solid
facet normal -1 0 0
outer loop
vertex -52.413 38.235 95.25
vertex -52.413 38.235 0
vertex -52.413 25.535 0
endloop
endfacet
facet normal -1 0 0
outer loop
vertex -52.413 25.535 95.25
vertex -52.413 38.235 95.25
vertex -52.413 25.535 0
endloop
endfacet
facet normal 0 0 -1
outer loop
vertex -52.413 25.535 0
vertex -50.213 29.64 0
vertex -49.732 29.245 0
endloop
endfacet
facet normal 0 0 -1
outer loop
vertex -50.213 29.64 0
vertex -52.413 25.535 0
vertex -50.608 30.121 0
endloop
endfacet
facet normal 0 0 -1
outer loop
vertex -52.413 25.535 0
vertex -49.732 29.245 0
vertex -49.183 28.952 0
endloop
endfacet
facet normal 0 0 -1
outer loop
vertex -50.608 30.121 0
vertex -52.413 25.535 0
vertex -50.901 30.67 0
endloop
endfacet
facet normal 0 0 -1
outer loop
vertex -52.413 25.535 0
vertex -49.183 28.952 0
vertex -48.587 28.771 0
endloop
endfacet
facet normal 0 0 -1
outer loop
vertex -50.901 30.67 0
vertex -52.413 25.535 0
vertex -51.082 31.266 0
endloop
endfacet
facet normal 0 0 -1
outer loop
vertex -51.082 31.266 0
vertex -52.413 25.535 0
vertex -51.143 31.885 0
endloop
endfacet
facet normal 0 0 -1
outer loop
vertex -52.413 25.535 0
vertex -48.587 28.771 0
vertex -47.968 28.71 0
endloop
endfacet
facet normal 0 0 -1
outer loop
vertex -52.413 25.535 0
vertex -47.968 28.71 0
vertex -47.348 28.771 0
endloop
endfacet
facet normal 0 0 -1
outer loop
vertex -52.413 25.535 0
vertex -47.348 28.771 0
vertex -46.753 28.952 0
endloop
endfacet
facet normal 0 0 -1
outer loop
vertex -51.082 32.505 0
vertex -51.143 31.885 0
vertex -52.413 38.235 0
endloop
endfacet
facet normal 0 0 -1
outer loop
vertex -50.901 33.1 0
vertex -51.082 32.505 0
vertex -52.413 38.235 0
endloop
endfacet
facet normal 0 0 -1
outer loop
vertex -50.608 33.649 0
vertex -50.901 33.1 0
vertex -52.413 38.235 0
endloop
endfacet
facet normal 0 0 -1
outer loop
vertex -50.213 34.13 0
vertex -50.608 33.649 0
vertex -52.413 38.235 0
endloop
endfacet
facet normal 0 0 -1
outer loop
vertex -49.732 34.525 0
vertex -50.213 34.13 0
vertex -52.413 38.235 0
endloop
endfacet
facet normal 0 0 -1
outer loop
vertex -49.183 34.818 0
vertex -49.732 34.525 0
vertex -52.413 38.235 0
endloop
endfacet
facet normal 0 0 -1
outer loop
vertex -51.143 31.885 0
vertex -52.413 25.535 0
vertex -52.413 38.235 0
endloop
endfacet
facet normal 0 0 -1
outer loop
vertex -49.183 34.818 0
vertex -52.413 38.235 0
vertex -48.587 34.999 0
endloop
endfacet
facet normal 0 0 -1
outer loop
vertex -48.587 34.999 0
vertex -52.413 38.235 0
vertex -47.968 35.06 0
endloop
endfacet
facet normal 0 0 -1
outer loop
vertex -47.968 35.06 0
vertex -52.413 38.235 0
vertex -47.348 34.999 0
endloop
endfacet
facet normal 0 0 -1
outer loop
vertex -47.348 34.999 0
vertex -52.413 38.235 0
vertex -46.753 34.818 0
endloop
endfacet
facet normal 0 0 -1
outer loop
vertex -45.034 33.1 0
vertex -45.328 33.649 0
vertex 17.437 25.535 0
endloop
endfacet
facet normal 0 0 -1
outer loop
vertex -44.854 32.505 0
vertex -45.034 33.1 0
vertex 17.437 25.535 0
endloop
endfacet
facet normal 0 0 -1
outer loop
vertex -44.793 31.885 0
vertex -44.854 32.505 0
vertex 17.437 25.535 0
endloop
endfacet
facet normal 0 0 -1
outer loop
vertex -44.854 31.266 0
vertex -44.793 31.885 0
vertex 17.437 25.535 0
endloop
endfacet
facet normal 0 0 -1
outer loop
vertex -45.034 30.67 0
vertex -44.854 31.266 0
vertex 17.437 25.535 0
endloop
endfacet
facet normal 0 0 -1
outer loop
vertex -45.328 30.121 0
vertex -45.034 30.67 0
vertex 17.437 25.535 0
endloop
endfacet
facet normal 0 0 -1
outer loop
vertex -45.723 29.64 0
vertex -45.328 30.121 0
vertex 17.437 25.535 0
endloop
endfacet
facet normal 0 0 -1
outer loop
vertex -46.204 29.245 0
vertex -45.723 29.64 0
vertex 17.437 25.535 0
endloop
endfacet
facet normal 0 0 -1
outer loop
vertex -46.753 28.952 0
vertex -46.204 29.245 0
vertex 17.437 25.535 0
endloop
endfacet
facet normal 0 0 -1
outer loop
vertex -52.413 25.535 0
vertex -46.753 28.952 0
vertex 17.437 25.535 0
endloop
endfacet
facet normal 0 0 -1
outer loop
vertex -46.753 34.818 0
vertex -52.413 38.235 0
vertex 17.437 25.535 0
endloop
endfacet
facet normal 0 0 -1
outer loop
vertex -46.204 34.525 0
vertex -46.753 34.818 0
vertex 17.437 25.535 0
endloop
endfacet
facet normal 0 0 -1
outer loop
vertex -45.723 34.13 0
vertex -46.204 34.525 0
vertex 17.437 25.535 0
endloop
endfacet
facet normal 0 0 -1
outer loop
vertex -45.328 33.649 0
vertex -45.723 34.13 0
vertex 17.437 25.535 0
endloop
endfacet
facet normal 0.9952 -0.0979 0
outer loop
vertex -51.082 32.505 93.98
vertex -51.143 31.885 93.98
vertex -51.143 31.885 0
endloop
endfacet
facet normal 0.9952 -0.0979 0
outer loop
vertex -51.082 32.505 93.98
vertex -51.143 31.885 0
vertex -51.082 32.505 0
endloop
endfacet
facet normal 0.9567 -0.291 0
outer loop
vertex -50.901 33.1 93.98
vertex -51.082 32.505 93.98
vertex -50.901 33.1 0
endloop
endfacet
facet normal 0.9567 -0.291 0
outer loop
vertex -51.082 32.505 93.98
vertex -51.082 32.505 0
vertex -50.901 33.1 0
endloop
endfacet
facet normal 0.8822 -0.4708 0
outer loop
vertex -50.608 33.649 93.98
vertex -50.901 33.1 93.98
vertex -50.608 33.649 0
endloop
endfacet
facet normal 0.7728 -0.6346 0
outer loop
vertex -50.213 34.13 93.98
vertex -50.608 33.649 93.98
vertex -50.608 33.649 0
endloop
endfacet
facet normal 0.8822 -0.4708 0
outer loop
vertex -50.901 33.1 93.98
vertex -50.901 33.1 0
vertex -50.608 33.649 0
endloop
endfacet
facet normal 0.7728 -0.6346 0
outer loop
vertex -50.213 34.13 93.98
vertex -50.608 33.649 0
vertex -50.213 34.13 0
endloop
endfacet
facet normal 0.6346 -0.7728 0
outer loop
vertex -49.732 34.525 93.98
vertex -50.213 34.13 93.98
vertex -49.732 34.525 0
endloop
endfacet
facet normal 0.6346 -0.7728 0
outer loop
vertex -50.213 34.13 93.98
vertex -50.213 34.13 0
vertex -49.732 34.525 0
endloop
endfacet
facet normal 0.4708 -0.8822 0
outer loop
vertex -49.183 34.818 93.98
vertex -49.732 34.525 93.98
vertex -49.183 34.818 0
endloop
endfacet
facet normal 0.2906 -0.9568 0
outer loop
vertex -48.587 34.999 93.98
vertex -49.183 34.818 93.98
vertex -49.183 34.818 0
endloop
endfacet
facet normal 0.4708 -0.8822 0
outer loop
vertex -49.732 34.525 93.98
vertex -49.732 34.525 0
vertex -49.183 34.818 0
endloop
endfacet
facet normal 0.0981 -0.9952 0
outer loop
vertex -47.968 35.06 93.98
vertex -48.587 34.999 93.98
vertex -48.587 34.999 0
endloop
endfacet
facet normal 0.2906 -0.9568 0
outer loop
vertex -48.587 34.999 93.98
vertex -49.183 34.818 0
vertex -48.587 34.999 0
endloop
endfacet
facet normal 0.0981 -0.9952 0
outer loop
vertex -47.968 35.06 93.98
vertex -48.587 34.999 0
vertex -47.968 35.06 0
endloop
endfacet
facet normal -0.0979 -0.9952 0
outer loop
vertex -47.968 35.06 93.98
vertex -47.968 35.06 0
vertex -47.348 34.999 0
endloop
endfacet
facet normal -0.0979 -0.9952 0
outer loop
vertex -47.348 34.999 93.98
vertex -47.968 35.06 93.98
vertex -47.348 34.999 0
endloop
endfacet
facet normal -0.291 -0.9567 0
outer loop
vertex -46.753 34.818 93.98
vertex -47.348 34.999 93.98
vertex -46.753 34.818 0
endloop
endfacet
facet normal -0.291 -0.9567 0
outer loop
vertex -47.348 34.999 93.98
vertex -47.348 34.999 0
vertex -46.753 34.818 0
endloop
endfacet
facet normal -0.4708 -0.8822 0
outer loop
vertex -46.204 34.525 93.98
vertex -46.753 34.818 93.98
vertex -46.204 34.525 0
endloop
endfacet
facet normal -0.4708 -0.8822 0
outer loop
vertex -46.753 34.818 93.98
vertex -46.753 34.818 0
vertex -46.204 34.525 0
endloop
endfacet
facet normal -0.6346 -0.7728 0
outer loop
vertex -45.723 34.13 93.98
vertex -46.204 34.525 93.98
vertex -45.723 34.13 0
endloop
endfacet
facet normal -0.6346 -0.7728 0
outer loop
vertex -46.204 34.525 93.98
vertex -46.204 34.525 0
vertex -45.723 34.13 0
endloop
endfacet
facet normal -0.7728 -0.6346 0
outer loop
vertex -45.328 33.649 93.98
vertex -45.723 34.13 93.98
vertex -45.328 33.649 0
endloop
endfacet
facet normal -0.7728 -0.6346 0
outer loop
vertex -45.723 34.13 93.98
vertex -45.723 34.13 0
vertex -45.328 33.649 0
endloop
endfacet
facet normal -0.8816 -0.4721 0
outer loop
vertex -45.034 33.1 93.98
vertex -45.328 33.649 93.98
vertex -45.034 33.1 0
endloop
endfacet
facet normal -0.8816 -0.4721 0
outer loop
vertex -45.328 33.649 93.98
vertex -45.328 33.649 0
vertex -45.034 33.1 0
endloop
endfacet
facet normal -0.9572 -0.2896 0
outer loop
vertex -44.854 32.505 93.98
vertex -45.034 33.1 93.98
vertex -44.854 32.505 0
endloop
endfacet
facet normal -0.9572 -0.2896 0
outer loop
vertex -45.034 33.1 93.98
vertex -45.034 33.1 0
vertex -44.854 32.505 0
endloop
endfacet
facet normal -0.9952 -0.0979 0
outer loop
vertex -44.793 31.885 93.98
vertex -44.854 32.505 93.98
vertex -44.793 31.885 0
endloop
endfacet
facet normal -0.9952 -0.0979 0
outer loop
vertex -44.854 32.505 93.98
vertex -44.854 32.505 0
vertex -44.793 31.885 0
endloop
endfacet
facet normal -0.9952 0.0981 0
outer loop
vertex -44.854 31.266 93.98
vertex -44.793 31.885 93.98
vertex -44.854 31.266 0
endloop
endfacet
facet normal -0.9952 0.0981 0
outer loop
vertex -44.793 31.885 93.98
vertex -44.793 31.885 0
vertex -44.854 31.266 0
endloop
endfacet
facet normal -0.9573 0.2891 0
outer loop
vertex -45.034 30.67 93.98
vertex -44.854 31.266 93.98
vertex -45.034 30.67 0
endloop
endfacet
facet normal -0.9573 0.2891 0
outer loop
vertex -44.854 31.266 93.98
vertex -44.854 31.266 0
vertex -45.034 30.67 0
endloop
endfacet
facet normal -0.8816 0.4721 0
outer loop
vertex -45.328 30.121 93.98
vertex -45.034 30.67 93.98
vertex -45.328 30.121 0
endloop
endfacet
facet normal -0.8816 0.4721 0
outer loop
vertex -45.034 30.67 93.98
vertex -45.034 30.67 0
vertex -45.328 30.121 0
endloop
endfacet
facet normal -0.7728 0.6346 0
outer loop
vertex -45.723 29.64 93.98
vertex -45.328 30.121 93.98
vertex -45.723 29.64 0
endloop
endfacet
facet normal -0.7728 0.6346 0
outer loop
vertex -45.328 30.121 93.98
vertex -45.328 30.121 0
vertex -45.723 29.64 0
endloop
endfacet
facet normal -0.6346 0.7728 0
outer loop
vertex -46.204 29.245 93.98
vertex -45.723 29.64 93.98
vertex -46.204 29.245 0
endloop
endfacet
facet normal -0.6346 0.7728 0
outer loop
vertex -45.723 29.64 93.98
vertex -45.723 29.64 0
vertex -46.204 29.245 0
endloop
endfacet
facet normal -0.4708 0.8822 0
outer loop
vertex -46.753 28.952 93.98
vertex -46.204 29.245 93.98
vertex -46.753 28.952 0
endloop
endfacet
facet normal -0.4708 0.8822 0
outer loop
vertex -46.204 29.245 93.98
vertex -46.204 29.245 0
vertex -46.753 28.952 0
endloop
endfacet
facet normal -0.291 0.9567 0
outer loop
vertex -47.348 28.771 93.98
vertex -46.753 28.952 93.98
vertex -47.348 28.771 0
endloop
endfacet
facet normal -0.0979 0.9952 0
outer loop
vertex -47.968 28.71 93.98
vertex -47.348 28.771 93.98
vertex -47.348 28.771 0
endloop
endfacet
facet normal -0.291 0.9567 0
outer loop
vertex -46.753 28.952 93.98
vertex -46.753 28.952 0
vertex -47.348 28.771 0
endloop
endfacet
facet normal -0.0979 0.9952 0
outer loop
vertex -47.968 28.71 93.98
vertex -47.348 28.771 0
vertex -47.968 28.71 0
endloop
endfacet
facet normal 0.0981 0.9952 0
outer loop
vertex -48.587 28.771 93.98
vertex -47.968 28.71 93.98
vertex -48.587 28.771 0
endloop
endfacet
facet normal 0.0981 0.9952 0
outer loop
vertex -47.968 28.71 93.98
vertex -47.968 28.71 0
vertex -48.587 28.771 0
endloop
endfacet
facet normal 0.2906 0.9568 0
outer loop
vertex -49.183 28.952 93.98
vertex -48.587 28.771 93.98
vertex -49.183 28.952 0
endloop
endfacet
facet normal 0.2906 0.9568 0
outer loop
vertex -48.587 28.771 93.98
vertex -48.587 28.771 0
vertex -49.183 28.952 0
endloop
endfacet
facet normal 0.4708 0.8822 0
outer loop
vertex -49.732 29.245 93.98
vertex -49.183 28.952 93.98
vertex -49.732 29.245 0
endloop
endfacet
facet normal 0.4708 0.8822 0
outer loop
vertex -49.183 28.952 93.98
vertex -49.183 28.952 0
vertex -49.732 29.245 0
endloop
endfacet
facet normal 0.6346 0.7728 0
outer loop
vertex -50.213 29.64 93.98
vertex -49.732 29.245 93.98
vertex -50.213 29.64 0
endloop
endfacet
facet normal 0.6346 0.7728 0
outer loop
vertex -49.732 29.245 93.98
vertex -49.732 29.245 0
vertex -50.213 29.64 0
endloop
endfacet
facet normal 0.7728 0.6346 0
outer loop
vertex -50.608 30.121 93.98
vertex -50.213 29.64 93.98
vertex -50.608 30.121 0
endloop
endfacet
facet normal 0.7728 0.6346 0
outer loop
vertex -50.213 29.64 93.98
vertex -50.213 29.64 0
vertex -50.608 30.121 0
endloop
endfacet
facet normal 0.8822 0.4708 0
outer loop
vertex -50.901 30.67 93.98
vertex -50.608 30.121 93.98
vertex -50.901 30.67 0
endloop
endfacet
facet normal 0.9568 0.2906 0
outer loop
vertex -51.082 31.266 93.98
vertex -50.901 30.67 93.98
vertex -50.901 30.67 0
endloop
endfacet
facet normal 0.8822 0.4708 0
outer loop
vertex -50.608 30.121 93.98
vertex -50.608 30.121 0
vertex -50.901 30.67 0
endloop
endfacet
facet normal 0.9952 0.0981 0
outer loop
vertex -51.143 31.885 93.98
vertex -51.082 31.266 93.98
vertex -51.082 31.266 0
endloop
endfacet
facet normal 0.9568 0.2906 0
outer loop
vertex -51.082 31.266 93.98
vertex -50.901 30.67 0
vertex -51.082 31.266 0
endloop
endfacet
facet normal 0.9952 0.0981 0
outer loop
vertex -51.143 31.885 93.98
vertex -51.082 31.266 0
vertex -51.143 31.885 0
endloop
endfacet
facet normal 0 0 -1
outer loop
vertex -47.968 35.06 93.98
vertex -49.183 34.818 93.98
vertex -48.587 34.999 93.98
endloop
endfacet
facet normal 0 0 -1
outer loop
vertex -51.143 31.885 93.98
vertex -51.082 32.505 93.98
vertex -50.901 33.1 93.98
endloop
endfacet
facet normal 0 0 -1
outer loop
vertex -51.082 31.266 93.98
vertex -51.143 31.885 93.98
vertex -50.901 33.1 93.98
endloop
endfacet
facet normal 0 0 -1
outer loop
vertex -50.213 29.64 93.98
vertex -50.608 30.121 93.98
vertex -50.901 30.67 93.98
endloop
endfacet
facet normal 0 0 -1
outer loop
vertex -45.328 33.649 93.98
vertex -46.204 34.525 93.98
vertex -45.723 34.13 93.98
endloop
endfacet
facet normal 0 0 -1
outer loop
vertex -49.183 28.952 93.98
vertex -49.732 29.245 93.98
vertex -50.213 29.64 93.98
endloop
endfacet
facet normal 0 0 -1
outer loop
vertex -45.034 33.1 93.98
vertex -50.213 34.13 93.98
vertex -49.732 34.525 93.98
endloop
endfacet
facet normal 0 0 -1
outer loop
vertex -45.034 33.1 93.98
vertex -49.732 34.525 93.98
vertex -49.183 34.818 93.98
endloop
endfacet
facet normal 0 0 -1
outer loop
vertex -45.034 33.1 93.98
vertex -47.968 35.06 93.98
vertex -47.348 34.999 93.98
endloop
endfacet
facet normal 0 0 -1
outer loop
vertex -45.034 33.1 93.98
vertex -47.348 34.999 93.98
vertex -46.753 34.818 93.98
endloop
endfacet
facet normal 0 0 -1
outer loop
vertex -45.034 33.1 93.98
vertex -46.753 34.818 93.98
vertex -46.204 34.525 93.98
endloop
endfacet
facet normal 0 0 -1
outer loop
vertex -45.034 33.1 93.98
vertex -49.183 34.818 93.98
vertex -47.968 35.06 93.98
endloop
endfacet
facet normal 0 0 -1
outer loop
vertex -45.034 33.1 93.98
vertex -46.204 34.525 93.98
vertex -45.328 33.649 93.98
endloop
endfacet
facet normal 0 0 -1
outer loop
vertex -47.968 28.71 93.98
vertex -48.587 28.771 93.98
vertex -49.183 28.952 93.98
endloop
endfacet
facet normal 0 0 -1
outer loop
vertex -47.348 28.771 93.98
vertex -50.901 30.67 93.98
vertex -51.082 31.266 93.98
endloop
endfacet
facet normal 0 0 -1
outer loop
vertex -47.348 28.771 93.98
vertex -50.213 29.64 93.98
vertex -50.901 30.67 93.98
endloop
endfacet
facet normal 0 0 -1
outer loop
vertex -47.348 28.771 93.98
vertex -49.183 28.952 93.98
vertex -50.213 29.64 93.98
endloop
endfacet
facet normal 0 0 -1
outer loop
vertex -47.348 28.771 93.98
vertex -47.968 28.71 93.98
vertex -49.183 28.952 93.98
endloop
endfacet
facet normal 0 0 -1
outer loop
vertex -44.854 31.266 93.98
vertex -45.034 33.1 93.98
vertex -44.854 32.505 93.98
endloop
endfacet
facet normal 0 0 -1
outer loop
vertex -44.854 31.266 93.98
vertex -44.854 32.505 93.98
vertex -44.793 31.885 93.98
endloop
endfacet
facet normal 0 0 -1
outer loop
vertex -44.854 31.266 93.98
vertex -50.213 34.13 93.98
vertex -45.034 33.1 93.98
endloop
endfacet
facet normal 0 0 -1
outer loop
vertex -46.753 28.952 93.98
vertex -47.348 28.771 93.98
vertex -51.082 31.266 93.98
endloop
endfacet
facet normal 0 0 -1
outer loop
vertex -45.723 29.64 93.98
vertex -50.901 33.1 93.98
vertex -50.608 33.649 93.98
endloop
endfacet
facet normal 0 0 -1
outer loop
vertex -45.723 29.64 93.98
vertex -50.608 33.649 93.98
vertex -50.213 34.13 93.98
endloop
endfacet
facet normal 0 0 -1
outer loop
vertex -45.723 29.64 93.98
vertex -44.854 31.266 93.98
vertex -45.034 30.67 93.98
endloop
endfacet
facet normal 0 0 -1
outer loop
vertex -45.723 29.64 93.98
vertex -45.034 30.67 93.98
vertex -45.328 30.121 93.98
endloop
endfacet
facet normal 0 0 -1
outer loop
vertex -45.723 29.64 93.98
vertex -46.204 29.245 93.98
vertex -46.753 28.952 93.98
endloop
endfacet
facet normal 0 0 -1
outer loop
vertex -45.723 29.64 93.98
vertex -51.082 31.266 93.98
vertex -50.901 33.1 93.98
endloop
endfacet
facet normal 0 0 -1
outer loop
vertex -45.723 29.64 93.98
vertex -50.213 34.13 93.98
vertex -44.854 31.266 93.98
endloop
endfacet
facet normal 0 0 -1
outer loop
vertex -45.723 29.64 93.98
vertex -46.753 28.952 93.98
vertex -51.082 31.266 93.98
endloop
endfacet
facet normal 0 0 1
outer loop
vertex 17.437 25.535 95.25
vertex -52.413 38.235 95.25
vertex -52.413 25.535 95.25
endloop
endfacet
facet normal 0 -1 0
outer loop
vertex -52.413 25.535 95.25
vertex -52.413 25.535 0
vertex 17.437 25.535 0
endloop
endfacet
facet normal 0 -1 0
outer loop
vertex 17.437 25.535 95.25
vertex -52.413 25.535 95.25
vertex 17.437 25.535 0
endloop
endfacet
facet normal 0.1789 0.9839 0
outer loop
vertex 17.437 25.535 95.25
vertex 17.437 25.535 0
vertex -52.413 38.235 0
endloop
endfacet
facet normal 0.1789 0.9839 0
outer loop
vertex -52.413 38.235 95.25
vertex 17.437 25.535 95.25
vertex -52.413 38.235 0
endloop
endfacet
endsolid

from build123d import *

# Parameters (mm, degrees)
F1_DEPTH = 95.25
F3_DEPTH = 93.98


with BuildPart() as f1:
    # F0 (on Top) → F1 (new body)
    with BuildSketch(Plane.XY):
        Polygon((-52.412679, 38.235107), (-52.412679, 25.535107), (17.437321, 25.535107), align=None)
    extrude(amount=F1_DEPTH)

    # F2 (on face) → F3 (cut)
    with BuildSketch(Plane(origin=(0, 0, 0), x_dir=(1, 0, 0), z_dir=(0, 0, -1))):
        with BuildLine():
            ThreePointArc((-44.792679, -31.885107), (-47.967679, -28.710107), (-51.142679, -31.885107))
            ThreePointArc((-51.142679, -31.885107), (-47.967679, -35.060107), (-44.792679, -31.885107))
        make_face()
    extrude(amount=-F3_DEPTH, mode=Mode.SUBTRACT)


solid = f1.part
